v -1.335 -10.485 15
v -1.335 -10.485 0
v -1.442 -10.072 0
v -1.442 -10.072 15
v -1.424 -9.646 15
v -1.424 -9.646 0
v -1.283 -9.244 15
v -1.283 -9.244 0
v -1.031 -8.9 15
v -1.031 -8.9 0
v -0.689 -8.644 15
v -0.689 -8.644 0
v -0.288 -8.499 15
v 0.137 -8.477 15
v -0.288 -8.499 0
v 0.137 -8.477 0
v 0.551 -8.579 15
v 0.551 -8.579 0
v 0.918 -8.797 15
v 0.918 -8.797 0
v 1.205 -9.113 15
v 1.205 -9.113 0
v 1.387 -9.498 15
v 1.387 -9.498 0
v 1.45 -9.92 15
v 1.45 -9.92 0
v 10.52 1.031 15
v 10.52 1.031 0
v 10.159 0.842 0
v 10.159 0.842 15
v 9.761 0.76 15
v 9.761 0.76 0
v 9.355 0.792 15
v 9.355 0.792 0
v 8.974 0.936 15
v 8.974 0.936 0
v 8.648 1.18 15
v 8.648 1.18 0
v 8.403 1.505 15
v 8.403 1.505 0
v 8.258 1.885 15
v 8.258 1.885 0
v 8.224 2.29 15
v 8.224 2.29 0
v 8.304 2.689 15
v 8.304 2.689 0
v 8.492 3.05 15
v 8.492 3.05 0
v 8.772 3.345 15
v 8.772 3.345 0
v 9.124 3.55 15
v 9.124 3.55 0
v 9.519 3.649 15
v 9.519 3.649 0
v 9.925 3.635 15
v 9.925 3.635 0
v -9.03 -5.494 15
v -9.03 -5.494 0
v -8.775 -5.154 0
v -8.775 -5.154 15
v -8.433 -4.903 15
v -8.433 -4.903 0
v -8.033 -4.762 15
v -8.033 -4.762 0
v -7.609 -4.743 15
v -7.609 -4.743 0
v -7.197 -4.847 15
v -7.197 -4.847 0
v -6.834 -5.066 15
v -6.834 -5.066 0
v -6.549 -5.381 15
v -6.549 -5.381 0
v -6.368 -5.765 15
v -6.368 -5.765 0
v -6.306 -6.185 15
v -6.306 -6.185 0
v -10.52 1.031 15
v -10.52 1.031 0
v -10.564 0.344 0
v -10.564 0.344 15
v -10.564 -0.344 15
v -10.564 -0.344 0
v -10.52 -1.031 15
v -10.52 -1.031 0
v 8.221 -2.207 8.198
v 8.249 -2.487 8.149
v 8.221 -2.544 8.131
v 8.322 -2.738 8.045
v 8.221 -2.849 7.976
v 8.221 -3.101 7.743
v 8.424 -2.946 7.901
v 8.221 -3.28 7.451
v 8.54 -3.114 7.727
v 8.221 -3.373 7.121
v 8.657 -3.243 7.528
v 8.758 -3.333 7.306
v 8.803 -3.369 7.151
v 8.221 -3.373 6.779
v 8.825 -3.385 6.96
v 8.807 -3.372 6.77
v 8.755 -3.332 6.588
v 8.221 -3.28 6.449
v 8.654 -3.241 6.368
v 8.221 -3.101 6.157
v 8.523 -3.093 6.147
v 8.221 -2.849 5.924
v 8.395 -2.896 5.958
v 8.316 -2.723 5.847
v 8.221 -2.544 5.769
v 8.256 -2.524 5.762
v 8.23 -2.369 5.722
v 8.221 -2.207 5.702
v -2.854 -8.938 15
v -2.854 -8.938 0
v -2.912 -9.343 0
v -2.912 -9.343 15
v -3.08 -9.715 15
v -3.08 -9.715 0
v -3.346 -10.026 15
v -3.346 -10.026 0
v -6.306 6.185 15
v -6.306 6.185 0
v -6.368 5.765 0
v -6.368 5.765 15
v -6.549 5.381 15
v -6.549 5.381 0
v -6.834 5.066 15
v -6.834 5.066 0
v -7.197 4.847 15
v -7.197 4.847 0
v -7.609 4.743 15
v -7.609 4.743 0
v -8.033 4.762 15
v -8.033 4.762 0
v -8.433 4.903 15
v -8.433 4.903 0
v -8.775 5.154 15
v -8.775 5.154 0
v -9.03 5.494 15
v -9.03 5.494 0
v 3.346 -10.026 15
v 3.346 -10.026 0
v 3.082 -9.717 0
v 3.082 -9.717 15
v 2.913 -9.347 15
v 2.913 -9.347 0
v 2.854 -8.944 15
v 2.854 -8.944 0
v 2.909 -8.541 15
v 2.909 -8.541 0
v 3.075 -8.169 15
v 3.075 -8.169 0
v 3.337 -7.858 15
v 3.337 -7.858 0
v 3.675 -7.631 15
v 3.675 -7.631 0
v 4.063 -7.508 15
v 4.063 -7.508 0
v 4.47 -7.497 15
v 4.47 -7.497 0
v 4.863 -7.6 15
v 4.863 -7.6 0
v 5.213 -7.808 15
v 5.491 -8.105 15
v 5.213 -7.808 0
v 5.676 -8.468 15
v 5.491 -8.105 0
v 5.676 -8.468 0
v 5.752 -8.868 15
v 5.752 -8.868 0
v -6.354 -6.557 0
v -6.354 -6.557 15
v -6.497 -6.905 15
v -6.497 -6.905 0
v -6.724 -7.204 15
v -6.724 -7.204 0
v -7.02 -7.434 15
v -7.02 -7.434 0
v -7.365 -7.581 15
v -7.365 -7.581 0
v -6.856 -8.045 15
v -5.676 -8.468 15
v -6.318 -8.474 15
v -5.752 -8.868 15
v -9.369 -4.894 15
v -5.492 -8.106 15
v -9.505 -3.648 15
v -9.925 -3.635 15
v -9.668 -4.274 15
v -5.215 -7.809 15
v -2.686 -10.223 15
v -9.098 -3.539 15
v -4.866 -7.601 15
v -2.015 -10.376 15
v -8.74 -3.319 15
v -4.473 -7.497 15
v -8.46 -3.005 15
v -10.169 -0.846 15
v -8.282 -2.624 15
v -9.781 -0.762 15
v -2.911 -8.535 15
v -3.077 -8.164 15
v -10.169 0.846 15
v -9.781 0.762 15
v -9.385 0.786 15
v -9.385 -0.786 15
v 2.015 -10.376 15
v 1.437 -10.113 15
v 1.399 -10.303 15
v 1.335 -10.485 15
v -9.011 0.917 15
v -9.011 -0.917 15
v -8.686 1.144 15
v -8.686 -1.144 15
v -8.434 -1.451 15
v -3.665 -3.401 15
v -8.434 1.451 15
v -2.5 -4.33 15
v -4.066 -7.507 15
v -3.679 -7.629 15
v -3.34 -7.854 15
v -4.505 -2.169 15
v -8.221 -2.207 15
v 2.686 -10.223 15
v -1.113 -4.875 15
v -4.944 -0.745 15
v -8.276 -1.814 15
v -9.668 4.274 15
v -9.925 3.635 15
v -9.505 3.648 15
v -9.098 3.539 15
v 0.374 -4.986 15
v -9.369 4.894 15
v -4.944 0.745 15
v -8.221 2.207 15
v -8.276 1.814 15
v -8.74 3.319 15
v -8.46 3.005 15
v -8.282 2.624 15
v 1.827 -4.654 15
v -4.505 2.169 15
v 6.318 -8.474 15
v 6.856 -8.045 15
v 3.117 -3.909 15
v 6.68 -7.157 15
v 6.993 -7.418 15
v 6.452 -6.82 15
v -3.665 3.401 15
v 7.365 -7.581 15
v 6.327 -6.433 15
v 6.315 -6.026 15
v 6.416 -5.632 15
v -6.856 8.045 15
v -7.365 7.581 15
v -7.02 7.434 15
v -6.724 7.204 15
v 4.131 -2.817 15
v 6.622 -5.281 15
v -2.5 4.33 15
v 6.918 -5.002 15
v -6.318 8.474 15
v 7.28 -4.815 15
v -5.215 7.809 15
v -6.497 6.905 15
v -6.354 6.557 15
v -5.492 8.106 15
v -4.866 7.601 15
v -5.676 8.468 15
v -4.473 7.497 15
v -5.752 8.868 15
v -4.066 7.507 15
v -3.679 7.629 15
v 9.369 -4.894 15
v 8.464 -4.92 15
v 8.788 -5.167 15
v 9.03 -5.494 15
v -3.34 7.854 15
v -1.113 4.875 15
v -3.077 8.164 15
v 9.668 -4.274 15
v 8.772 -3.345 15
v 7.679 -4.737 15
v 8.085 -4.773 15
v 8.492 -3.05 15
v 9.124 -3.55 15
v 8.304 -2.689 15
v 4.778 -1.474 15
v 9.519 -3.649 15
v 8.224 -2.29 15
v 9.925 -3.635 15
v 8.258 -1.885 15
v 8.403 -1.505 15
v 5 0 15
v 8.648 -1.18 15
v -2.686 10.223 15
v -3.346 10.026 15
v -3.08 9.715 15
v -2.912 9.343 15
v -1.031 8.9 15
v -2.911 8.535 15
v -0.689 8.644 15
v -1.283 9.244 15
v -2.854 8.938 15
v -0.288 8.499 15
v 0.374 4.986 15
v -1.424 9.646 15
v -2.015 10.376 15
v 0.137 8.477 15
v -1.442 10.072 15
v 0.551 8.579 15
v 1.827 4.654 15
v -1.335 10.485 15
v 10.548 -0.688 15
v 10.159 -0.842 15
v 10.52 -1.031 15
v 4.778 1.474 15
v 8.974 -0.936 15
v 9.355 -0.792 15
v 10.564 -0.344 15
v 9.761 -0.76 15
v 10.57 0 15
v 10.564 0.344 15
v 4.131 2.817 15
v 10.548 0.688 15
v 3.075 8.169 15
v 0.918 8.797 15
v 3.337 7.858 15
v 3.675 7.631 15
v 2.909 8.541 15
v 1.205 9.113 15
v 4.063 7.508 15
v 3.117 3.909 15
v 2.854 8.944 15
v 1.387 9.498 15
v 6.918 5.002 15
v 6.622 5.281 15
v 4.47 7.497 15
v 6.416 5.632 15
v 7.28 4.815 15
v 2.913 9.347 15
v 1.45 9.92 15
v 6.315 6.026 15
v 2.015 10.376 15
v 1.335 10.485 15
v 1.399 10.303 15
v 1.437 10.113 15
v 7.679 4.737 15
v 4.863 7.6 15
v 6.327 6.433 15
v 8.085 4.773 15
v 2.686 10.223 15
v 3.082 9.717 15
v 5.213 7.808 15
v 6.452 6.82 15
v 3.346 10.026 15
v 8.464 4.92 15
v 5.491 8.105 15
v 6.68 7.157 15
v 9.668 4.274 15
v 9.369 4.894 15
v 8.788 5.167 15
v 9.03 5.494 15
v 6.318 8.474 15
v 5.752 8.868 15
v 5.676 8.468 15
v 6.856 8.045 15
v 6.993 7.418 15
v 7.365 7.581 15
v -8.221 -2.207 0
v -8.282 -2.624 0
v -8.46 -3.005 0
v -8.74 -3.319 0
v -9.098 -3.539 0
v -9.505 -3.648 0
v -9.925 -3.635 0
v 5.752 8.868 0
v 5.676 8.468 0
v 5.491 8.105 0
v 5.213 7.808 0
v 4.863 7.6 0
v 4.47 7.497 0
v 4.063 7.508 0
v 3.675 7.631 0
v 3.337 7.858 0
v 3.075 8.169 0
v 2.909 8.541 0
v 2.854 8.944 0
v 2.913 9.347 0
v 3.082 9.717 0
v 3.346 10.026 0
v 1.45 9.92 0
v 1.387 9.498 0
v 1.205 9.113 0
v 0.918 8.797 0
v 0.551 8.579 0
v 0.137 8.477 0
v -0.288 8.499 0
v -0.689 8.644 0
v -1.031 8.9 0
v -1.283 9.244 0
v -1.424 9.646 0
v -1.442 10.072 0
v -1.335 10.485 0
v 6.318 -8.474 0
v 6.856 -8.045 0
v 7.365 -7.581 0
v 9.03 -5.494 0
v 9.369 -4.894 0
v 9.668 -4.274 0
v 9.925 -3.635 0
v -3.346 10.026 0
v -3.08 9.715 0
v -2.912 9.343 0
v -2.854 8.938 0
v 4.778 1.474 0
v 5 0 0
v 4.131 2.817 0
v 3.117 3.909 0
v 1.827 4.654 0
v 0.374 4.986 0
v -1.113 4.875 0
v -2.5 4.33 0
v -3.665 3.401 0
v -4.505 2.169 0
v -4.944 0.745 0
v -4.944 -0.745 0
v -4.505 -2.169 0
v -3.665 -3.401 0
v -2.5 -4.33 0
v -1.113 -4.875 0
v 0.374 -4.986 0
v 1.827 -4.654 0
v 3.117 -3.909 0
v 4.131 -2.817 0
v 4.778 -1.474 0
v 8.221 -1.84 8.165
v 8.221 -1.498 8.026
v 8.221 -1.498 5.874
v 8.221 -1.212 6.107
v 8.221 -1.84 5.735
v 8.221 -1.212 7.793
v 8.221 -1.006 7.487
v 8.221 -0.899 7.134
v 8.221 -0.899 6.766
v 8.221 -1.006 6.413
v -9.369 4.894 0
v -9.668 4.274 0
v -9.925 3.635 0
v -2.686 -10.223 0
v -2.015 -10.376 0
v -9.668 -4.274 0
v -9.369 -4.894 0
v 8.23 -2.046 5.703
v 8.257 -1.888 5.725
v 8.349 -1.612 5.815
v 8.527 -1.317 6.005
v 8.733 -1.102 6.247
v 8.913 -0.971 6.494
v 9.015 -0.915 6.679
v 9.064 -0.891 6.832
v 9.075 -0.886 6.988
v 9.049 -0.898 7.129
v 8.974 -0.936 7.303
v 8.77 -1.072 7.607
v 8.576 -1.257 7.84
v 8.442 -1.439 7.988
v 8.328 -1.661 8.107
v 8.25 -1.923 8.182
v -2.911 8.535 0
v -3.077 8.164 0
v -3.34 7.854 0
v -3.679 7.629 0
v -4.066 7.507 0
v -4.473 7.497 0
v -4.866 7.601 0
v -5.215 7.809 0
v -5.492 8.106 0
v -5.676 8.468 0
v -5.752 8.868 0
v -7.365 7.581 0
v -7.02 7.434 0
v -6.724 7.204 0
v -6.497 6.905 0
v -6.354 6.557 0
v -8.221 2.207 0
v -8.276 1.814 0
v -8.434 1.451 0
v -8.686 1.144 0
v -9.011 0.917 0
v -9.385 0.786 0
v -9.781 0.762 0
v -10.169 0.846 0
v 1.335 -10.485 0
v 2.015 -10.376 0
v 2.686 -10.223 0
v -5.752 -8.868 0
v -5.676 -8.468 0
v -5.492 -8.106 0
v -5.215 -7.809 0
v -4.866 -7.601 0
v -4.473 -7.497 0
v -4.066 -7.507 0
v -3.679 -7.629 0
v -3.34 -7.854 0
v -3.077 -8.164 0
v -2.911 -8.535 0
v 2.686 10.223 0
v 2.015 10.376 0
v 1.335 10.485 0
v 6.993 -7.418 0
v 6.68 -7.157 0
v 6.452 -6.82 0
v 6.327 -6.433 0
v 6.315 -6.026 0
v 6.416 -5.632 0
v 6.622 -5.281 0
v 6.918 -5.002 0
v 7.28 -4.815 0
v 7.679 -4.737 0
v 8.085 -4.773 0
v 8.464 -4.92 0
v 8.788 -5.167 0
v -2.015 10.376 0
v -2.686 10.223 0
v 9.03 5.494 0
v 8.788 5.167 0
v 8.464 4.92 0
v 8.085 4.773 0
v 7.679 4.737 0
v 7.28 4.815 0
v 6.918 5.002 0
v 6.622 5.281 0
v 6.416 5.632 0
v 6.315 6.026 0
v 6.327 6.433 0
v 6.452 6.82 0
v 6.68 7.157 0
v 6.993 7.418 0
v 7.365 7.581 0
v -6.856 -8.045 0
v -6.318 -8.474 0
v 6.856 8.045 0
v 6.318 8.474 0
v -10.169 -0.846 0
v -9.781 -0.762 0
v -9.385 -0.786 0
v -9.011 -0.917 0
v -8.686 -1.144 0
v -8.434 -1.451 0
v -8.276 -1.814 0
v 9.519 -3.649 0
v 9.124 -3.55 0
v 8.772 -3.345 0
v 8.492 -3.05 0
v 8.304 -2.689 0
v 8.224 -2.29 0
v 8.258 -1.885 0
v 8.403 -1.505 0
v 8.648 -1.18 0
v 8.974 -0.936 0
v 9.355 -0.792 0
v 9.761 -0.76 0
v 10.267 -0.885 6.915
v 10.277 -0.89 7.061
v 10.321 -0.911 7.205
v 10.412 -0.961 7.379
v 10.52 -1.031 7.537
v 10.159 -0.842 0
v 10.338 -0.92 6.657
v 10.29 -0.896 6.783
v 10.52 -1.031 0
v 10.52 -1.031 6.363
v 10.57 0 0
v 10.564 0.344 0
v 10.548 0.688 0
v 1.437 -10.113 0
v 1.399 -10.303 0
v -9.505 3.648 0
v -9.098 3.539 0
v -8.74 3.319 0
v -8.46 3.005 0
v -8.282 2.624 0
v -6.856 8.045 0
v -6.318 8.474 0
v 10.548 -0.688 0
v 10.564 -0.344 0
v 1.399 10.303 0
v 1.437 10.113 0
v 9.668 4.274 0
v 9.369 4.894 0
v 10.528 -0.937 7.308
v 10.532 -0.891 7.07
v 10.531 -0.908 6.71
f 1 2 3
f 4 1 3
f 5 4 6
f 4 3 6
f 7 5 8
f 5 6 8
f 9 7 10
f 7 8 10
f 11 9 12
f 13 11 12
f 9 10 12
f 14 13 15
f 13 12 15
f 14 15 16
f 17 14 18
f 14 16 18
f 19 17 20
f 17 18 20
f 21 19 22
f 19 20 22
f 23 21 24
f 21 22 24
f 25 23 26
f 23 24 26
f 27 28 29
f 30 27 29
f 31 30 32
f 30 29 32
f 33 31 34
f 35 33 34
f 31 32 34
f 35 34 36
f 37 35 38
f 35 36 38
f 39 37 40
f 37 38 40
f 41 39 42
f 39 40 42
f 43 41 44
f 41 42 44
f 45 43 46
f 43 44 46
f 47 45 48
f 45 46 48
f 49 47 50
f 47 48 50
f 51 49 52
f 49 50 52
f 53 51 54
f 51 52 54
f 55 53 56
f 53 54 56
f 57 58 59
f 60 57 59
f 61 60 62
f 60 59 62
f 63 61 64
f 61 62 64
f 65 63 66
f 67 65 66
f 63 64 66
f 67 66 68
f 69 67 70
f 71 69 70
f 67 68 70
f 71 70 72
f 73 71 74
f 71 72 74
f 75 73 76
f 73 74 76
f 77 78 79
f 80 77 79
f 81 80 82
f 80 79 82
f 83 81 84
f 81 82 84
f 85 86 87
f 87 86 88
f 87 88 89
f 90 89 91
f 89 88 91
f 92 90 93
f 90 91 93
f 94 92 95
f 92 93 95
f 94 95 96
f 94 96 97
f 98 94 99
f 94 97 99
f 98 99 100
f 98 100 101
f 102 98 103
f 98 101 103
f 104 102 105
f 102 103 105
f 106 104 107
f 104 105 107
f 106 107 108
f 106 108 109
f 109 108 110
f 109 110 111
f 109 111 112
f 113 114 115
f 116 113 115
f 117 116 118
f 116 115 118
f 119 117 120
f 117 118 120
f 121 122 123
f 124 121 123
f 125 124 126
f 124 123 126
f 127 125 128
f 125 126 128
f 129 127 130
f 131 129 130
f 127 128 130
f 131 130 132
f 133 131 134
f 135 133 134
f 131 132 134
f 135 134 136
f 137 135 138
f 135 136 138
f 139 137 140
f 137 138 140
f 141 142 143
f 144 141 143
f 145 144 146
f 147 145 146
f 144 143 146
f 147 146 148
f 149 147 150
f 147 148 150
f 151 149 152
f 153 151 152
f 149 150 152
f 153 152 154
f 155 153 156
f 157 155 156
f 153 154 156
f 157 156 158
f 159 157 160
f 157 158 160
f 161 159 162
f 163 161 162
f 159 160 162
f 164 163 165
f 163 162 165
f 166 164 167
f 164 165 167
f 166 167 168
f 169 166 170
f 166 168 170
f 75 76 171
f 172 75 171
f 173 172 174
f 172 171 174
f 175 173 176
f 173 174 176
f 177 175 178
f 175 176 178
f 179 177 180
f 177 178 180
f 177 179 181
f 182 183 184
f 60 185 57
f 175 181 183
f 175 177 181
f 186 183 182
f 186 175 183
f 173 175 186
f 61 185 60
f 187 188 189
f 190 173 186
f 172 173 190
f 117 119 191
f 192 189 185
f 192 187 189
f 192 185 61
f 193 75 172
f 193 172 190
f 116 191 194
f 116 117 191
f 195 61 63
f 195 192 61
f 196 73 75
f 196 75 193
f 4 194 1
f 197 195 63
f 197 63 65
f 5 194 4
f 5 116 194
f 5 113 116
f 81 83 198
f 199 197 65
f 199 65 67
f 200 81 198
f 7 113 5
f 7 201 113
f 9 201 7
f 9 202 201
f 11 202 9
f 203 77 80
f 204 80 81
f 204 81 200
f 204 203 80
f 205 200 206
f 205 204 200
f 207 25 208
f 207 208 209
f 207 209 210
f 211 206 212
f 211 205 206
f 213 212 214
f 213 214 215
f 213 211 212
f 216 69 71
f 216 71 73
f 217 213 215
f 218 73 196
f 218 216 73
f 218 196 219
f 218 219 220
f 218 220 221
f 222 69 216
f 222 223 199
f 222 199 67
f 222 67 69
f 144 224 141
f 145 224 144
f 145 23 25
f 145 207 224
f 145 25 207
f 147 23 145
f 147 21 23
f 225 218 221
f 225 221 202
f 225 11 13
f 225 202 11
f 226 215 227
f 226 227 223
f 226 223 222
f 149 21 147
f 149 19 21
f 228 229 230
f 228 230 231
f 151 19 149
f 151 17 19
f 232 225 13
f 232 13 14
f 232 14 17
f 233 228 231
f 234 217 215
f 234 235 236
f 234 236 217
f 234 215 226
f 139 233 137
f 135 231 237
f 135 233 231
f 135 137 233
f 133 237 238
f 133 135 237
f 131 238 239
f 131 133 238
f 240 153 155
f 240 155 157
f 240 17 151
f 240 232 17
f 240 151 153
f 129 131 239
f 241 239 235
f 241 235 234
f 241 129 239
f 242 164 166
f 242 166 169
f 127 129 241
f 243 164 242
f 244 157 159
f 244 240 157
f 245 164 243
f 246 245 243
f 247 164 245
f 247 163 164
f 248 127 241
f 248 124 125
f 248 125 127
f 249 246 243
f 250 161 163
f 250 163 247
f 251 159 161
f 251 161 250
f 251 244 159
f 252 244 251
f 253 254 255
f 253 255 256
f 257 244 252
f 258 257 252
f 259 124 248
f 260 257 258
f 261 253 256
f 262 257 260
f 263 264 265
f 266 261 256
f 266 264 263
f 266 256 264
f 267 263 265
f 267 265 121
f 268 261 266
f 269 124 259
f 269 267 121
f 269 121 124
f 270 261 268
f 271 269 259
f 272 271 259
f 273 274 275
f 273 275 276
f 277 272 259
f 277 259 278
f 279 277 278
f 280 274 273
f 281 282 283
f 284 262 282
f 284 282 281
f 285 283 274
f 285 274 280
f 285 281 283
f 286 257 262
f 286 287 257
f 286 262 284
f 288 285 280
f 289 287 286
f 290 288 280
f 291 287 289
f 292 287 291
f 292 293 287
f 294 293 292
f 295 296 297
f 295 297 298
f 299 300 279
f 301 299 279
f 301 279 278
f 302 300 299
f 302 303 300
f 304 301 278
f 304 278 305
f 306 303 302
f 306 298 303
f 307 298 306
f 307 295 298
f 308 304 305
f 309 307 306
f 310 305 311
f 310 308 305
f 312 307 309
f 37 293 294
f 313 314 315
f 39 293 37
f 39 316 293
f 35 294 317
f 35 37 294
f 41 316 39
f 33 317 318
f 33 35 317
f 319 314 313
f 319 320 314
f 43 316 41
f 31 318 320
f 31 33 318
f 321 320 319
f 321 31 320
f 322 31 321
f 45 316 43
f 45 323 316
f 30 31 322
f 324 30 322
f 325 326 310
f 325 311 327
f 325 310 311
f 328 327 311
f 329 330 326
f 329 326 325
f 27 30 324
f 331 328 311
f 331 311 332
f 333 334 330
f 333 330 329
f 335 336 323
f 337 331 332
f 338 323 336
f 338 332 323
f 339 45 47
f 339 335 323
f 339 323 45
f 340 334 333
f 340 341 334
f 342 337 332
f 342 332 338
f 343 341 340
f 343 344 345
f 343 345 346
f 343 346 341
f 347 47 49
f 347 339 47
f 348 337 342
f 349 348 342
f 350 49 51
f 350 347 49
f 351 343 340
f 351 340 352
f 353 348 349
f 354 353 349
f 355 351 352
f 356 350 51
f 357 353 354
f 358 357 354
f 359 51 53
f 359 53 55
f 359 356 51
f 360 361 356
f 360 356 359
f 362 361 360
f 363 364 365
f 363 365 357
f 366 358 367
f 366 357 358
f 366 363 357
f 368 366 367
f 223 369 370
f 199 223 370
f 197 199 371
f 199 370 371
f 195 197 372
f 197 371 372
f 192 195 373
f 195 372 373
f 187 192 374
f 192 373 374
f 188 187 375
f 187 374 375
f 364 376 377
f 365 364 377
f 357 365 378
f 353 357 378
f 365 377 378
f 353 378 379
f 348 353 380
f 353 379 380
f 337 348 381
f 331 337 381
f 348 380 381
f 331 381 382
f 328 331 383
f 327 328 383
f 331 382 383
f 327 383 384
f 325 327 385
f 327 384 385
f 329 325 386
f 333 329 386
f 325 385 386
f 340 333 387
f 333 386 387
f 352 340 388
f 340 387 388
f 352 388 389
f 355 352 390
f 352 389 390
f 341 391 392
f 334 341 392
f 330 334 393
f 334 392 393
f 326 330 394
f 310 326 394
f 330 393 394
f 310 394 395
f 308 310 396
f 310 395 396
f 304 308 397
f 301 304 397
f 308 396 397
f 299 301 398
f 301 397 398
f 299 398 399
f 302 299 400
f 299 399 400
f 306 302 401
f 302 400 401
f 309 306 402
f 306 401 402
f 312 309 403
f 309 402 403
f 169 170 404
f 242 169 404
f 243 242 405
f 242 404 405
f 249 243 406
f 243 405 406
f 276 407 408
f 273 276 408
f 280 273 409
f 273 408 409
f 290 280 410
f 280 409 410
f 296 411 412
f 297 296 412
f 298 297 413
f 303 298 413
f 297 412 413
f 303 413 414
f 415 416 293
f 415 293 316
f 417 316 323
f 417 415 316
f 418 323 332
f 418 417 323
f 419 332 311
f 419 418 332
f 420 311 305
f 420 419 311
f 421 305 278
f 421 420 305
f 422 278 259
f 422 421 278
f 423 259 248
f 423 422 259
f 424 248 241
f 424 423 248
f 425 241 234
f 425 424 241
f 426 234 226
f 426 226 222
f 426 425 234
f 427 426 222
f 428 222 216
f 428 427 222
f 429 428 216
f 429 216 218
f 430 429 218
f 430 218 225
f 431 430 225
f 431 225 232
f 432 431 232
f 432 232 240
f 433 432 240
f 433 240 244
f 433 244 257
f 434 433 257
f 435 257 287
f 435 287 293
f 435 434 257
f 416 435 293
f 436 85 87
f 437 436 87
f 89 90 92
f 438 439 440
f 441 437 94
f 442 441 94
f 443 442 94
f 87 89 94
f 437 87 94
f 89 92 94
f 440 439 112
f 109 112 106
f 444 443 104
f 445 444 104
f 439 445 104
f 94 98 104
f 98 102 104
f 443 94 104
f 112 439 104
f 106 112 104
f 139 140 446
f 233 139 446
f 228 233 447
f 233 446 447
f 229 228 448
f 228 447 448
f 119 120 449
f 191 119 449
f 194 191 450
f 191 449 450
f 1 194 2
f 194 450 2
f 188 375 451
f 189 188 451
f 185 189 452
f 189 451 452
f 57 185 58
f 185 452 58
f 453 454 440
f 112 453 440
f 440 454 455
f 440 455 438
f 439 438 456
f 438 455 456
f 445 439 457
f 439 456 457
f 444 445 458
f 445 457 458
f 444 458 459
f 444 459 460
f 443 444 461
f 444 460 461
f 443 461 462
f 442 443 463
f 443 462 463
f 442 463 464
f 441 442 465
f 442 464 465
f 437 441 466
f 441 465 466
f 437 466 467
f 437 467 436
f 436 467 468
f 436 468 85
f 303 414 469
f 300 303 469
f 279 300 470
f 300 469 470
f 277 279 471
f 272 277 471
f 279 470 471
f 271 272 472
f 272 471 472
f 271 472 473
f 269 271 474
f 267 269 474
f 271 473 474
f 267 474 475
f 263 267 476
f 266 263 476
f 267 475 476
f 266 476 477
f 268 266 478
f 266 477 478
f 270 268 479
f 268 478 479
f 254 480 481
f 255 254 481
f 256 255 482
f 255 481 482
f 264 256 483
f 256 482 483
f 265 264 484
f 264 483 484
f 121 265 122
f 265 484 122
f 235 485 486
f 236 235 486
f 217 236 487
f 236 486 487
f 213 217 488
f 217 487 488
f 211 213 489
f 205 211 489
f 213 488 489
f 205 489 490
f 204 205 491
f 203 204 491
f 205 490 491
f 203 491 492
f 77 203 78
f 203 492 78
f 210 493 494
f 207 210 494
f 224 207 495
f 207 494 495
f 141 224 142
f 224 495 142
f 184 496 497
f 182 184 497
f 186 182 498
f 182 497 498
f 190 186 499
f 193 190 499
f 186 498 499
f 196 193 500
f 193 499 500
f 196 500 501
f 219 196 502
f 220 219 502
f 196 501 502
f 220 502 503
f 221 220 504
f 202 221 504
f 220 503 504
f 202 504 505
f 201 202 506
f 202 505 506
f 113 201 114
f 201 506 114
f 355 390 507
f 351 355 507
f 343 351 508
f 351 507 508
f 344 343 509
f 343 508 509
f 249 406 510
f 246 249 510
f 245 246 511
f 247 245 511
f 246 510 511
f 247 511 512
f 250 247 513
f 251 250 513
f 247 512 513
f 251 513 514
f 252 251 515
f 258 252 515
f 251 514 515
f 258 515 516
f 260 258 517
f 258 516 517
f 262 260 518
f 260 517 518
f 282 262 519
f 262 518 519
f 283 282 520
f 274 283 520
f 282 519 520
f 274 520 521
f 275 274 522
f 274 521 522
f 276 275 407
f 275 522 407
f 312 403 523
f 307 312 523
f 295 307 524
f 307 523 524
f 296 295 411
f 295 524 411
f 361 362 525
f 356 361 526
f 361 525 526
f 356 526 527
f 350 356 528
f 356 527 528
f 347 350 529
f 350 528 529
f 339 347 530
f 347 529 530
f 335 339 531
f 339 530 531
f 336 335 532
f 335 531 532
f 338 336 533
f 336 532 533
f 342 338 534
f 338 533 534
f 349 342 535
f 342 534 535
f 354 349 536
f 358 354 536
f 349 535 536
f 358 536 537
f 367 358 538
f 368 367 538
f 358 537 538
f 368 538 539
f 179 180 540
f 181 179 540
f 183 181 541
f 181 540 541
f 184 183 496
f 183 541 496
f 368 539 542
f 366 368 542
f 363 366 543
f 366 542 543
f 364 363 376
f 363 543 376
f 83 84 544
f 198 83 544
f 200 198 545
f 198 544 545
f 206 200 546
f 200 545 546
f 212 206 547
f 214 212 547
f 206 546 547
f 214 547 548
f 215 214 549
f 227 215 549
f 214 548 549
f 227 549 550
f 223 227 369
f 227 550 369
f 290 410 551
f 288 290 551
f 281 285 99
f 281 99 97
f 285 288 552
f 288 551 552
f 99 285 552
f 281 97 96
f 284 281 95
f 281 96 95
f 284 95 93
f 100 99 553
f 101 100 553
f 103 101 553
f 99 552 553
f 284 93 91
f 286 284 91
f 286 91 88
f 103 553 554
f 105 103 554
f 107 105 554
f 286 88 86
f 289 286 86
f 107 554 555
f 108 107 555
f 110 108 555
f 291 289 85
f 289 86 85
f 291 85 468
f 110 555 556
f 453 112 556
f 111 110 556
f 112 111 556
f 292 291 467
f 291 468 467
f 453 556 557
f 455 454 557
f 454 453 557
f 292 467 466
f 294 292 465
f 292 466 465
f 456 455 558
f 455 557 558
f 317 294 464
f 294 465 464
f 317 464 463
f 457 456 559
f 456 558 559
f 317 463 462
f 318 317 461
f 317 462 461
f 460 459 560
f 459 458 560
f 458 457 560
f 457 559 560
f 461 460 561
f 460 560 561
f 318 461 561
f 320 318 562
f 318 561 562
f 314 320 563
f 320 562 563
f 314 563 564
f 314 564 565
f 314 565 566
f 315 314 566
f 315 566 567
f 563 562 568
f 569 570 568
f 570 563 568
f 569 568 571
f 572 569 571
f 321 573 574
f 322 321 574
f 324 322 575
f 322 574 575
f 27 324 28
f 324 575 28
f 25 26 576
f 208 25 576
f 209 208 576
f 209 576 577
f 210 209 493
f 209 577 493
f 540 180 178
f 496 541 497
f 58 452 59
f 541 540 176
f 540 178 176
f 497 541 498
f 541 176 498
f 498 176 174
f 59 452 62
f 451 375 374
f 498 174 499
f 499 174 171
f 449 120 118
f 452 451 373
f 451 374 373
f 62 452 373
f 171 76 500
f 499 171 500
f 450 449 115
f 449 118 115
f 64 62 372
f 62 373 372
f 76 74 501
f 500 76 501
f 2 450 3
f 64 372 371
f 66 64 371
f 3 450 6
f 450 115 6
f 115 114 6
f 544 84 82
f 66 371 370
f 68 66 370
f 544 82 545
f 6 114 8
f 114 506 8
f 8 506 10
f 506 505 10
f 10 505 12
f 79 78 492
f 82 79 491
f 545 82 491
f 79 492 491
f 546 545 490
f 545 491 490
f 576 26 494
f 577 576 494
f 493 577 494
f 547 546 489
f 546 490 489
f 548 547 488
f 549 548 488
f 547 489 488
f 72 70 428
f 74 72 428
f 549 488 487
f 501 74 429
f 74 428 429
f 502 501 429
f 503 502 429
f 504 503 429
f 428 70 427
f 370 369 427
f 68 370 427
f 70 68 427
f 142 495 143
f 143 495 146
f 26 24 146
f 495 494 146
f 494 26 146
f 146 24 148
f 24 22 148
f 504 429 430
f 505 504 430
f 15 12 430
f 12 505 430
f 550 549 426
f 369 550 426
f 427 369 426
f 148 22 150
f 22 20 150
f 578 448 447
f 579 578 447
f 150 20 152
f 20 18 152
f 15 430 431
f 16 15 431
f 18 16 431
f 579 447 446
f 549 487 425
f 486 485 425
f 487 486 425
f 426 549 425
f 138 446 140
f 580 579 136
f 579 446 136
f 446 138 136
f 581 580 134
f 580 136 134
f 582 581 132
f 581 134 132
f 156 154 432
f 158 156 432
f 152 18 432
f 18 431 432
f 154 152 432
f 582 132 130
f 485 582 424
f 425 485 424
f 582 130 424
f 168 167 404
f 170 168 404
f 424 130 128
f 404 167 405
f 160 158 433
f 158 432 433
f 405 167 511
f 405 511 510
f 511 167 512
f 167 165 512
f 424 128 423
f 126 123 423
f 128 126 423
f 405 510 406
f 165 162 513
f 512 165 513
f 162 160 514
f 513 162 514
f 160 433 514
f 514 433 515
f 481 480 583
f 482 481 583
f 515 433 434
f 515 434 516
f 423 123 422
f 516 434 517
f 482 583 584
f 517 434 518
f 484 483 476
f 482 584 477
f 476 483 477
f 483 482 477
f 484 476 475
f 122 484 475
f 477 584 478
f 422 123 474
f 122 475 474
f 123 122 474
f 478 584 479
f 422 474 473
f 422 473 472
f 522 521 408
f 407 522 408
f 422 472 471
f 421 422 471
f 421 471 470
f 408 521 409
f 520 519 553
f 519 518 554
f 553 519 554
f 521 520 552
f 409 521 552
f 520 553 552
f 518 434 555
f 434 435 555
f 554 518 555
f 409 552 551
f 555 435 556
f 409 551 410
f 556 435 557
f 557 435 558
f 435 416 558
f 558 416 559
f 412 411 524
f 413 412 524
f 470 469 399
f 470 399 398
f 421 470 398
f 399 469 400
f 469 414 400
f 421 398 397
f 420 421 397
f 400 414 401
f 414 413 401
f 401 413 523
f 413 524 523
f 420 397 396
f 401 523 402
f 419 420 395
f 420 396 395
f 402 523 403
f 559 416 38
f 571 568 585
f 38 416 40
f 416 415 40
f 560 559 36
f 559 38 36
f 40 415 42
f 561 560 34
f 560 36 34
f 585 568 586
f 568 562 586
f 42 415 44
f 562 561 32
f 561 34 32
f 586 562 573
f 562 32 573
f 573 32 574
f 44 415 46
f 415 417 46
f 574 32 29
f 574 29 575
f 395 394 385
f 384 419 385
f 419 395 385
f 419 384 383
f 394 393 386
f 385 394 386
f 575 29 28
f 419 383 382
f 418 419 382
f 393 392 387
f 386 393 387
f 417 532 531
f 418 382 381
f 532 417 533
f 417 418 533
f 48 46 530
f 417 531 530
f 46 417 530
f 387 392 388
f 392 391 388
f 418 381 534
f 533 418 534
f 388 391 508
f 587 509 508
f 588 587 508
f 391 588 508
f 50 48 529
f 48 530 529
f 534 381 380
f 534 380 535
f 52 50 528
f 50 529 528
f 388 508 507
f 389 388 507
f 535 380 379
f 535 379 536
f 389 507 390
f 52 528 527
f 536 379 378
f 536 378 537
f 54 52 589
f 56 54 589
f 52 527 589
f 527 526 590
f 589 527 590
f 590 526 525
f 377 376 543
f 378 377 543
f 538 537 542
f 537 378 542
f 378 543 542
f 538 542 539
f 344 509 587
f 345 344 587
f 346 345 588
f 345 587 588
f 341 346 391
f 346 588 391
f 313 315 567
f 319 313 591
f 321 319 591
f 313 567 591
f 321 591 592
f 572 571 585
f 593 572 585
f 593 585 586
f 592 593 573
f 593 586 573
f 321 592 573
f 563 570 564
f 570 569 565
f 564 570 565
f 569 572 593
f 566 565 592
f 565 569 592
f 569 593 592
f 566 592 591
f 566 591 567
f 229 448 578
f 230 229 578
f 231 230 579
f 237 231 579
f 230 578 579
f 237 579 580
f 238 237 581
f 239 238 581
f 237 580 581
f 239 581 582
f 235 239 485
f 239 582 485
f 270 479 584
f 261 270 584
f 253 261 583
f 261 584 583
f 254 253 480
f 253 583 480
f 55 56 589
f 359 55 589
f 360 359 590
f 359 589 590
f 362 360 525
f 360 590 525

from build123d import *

# Parameters (mm, degrees)
SKETCH1_R           = 5
BOSS_EXTRUDE1_DEPTH = 15
SKETCH7_W           = 1.25
SKETCH7_H           = 2.348715111


with BuildPart() as part:
    # Sketch1 → Boss-Extrude1 (new body)
    with BuildSketch(Plane.XY):
        with BuildLine():
            ThreePointArc((10.519556214, -1.031424774), (10.557381521, -0.516328781), (10.57, 0))
            ThreePointArc((10.57, 0), (10.557381521, 0.516328781), (10.519556214, 1.031424774))
            ThreePointArc((10.519556214, 1.031424774), (8.257639416, 1.884752311), (9.92531109, 3.634982773))
            ThreePointArc((9.92531109, 3.634982773), (9.523240934, 4.586151122), (9.030274215, 5.493545995))
            ThreePointArc((9.030274215, 5.493545995), (6.622112657, 5.280958622), (7.36523638, 7.581437401))
            ThreePointArc((7.36523638, 7.581437401), (6.590287206, 8.26395877), (5.752435659, 8.867603058))
            ThreePointArc((5.752435659, 8.867603058), (3.67499527, 7.631206311), (3.346386275, 10.026295373))
            ThreePointArc((3.346386275, 10.026295373), (2.352046272, 10.304988032), (1.335256672, 10.485322581))
            ThreePointArc((1.335256672, 10.485322581), (1.421024661, 10.208424883), (1.45, 9.92))
            ThreePointArc((1.45, 9.92), (-0.288424883, 8.498975339), (-1.335256672, 10.485322581))
            ThreePointArc((-1.335256672, 10.485322581), (-2.352046272, 10.304988032), (-3.346386275, 10.026295373))
            ThreePointArc((-3.346386275, 10.026295373), (-2.98291066, 9.535012373), (-2.854126692, 8.93761117))
            ThreePointArc((-2.854126692, 8.93761117), (-4.269112426, 7.488033989), (-5.752435659, 8.867603058))
            ThreePointArc((-5.752435659, 8.867603058), (-6.590287206, 8.26395877), (-7.36523638, 7.581437401))
            ThreePointArc((-7.36523638, 7.581437401), (-6.600612193, 7.061440168), (-6.305768306, 6.185018834))
            ThreePointArc((-6.305768306, 6.185018834), (-7.399070653, 4.779576988), (-9.030274215, 5.493545995))
            ThreePointArc((-9.030274215, 5.493545995), (-9.523240934, 4.586151122), (-9.92531109, 3.634982773))
            ThreePointArc((-9.92531109, 3.634982773), (-8.740113044, 3.318901703), (-8.221284889, 2.207407665))
            ThreePointArc((-8.221284889, 2.207407665), (-9.010790158, 0.916575875), (-10.519556214, 1.031424774))
            ThreePointArc((-10.519556214, 1.031424774), (-10.57, 0), (-10.519556214, -1.031424774))
            ThreePointArc((-10.519556214, -1.031424774), (-9.010790158, -0.916575875), (-8.221284889, -2.207407665))
            ThreePointArc((-8.221284889, -2.207407665), (-8.740113044, -3.318901703), (-9.92531109, -3.634982773))
            ThreePointArc((-9.92531109, -3.634982773), (-9.523240934, -4.586151122), (-9.030274215, -5.493545995))
            ThreePointArc((-9.030274215, -5.493545995), (-7.399070653, -4.779576988), (-6.305768306, -6.185018834))
            ThreePointArc((-6.305768306, -6.185018834), (-6.600612193, -7.061440168), (-7.36523638, -7.581437401))
            ThreePointArc((-7.36523638, -7.581437401), (-6.590287206, -8.26395877), (-5.752435659, -8.867603058))
            ThreePointArc((-5.752435659, -8.867603058), (-4.269112426, -7.488033989), (-2.854126692, -8.93761117))
            ThreePointArc((-2.854126692, -8.93761117), (-2.98291066, -9.535012373), (-3.346386275, -10.026295373))
            ThreePointArc((-3.346386275, -10.026295373), (-2.352046272, -10.304988032), (-1.335256672, -10.485322581))
            ThreePointArc((-1.335256672, -10.485322581), (-0.288424883, -8.498975339), (1.45, -9.92))
            ThreePointArc((1.45, -9.92), (1.421024661, -10.208424883), (1.335256672, -10.485322581))
            ThreePointArc((1.335256672, -10.485322581), (2.352046272, -10.304988032), (3.346386275, -10.026295373))
            ThreePointArc((3.346386275, -10.026295373), (3.67499527, -7.631206311), (5.752435659, -8.867603058))
            ThreePointArc((5.752435659, -8.867603058), (6.590287206, -8.26395877), (7.36523638, -7.581437401))
            ThreePointArc((7.36523638, -7.581437401), (6.622112657, -5.280958622), (9.030274215, -5.493545995))
            ThreePointArc((9.030274215, -5.493545995), (9.523240934, -4.586151122), (9.92531109, -3.634982773))
            ThreePointArc((9.92531109, -3.634982773), (8.257639416, -1.884752311), (10.519556214, -1.031424774))
        make_face()
        Circle(SKETCH1_R, mode=Mode.SUBTRACT)
    extrude(amount=BOSS_EXTRUDE1_DEPTH)

    # Sketch7 → M3 Tapped Hole1 (revolve, cut)
    with BuildSketch(Plane(origin=(8.221284889, -2.134982773, 6.95), x_dir=(0, 0, 1), z_dir=(0, 1, 0))):
        with Locations((0.625, 1.174357556)):
            Rectangle(SKETCH7_W, SKETCH7_H)
    revolve(axis=Axis((1.871284889, -2.134982773, 6.95), (1, 0, 0)), mode=Mode.SUBTRACT)


solid = part.part
